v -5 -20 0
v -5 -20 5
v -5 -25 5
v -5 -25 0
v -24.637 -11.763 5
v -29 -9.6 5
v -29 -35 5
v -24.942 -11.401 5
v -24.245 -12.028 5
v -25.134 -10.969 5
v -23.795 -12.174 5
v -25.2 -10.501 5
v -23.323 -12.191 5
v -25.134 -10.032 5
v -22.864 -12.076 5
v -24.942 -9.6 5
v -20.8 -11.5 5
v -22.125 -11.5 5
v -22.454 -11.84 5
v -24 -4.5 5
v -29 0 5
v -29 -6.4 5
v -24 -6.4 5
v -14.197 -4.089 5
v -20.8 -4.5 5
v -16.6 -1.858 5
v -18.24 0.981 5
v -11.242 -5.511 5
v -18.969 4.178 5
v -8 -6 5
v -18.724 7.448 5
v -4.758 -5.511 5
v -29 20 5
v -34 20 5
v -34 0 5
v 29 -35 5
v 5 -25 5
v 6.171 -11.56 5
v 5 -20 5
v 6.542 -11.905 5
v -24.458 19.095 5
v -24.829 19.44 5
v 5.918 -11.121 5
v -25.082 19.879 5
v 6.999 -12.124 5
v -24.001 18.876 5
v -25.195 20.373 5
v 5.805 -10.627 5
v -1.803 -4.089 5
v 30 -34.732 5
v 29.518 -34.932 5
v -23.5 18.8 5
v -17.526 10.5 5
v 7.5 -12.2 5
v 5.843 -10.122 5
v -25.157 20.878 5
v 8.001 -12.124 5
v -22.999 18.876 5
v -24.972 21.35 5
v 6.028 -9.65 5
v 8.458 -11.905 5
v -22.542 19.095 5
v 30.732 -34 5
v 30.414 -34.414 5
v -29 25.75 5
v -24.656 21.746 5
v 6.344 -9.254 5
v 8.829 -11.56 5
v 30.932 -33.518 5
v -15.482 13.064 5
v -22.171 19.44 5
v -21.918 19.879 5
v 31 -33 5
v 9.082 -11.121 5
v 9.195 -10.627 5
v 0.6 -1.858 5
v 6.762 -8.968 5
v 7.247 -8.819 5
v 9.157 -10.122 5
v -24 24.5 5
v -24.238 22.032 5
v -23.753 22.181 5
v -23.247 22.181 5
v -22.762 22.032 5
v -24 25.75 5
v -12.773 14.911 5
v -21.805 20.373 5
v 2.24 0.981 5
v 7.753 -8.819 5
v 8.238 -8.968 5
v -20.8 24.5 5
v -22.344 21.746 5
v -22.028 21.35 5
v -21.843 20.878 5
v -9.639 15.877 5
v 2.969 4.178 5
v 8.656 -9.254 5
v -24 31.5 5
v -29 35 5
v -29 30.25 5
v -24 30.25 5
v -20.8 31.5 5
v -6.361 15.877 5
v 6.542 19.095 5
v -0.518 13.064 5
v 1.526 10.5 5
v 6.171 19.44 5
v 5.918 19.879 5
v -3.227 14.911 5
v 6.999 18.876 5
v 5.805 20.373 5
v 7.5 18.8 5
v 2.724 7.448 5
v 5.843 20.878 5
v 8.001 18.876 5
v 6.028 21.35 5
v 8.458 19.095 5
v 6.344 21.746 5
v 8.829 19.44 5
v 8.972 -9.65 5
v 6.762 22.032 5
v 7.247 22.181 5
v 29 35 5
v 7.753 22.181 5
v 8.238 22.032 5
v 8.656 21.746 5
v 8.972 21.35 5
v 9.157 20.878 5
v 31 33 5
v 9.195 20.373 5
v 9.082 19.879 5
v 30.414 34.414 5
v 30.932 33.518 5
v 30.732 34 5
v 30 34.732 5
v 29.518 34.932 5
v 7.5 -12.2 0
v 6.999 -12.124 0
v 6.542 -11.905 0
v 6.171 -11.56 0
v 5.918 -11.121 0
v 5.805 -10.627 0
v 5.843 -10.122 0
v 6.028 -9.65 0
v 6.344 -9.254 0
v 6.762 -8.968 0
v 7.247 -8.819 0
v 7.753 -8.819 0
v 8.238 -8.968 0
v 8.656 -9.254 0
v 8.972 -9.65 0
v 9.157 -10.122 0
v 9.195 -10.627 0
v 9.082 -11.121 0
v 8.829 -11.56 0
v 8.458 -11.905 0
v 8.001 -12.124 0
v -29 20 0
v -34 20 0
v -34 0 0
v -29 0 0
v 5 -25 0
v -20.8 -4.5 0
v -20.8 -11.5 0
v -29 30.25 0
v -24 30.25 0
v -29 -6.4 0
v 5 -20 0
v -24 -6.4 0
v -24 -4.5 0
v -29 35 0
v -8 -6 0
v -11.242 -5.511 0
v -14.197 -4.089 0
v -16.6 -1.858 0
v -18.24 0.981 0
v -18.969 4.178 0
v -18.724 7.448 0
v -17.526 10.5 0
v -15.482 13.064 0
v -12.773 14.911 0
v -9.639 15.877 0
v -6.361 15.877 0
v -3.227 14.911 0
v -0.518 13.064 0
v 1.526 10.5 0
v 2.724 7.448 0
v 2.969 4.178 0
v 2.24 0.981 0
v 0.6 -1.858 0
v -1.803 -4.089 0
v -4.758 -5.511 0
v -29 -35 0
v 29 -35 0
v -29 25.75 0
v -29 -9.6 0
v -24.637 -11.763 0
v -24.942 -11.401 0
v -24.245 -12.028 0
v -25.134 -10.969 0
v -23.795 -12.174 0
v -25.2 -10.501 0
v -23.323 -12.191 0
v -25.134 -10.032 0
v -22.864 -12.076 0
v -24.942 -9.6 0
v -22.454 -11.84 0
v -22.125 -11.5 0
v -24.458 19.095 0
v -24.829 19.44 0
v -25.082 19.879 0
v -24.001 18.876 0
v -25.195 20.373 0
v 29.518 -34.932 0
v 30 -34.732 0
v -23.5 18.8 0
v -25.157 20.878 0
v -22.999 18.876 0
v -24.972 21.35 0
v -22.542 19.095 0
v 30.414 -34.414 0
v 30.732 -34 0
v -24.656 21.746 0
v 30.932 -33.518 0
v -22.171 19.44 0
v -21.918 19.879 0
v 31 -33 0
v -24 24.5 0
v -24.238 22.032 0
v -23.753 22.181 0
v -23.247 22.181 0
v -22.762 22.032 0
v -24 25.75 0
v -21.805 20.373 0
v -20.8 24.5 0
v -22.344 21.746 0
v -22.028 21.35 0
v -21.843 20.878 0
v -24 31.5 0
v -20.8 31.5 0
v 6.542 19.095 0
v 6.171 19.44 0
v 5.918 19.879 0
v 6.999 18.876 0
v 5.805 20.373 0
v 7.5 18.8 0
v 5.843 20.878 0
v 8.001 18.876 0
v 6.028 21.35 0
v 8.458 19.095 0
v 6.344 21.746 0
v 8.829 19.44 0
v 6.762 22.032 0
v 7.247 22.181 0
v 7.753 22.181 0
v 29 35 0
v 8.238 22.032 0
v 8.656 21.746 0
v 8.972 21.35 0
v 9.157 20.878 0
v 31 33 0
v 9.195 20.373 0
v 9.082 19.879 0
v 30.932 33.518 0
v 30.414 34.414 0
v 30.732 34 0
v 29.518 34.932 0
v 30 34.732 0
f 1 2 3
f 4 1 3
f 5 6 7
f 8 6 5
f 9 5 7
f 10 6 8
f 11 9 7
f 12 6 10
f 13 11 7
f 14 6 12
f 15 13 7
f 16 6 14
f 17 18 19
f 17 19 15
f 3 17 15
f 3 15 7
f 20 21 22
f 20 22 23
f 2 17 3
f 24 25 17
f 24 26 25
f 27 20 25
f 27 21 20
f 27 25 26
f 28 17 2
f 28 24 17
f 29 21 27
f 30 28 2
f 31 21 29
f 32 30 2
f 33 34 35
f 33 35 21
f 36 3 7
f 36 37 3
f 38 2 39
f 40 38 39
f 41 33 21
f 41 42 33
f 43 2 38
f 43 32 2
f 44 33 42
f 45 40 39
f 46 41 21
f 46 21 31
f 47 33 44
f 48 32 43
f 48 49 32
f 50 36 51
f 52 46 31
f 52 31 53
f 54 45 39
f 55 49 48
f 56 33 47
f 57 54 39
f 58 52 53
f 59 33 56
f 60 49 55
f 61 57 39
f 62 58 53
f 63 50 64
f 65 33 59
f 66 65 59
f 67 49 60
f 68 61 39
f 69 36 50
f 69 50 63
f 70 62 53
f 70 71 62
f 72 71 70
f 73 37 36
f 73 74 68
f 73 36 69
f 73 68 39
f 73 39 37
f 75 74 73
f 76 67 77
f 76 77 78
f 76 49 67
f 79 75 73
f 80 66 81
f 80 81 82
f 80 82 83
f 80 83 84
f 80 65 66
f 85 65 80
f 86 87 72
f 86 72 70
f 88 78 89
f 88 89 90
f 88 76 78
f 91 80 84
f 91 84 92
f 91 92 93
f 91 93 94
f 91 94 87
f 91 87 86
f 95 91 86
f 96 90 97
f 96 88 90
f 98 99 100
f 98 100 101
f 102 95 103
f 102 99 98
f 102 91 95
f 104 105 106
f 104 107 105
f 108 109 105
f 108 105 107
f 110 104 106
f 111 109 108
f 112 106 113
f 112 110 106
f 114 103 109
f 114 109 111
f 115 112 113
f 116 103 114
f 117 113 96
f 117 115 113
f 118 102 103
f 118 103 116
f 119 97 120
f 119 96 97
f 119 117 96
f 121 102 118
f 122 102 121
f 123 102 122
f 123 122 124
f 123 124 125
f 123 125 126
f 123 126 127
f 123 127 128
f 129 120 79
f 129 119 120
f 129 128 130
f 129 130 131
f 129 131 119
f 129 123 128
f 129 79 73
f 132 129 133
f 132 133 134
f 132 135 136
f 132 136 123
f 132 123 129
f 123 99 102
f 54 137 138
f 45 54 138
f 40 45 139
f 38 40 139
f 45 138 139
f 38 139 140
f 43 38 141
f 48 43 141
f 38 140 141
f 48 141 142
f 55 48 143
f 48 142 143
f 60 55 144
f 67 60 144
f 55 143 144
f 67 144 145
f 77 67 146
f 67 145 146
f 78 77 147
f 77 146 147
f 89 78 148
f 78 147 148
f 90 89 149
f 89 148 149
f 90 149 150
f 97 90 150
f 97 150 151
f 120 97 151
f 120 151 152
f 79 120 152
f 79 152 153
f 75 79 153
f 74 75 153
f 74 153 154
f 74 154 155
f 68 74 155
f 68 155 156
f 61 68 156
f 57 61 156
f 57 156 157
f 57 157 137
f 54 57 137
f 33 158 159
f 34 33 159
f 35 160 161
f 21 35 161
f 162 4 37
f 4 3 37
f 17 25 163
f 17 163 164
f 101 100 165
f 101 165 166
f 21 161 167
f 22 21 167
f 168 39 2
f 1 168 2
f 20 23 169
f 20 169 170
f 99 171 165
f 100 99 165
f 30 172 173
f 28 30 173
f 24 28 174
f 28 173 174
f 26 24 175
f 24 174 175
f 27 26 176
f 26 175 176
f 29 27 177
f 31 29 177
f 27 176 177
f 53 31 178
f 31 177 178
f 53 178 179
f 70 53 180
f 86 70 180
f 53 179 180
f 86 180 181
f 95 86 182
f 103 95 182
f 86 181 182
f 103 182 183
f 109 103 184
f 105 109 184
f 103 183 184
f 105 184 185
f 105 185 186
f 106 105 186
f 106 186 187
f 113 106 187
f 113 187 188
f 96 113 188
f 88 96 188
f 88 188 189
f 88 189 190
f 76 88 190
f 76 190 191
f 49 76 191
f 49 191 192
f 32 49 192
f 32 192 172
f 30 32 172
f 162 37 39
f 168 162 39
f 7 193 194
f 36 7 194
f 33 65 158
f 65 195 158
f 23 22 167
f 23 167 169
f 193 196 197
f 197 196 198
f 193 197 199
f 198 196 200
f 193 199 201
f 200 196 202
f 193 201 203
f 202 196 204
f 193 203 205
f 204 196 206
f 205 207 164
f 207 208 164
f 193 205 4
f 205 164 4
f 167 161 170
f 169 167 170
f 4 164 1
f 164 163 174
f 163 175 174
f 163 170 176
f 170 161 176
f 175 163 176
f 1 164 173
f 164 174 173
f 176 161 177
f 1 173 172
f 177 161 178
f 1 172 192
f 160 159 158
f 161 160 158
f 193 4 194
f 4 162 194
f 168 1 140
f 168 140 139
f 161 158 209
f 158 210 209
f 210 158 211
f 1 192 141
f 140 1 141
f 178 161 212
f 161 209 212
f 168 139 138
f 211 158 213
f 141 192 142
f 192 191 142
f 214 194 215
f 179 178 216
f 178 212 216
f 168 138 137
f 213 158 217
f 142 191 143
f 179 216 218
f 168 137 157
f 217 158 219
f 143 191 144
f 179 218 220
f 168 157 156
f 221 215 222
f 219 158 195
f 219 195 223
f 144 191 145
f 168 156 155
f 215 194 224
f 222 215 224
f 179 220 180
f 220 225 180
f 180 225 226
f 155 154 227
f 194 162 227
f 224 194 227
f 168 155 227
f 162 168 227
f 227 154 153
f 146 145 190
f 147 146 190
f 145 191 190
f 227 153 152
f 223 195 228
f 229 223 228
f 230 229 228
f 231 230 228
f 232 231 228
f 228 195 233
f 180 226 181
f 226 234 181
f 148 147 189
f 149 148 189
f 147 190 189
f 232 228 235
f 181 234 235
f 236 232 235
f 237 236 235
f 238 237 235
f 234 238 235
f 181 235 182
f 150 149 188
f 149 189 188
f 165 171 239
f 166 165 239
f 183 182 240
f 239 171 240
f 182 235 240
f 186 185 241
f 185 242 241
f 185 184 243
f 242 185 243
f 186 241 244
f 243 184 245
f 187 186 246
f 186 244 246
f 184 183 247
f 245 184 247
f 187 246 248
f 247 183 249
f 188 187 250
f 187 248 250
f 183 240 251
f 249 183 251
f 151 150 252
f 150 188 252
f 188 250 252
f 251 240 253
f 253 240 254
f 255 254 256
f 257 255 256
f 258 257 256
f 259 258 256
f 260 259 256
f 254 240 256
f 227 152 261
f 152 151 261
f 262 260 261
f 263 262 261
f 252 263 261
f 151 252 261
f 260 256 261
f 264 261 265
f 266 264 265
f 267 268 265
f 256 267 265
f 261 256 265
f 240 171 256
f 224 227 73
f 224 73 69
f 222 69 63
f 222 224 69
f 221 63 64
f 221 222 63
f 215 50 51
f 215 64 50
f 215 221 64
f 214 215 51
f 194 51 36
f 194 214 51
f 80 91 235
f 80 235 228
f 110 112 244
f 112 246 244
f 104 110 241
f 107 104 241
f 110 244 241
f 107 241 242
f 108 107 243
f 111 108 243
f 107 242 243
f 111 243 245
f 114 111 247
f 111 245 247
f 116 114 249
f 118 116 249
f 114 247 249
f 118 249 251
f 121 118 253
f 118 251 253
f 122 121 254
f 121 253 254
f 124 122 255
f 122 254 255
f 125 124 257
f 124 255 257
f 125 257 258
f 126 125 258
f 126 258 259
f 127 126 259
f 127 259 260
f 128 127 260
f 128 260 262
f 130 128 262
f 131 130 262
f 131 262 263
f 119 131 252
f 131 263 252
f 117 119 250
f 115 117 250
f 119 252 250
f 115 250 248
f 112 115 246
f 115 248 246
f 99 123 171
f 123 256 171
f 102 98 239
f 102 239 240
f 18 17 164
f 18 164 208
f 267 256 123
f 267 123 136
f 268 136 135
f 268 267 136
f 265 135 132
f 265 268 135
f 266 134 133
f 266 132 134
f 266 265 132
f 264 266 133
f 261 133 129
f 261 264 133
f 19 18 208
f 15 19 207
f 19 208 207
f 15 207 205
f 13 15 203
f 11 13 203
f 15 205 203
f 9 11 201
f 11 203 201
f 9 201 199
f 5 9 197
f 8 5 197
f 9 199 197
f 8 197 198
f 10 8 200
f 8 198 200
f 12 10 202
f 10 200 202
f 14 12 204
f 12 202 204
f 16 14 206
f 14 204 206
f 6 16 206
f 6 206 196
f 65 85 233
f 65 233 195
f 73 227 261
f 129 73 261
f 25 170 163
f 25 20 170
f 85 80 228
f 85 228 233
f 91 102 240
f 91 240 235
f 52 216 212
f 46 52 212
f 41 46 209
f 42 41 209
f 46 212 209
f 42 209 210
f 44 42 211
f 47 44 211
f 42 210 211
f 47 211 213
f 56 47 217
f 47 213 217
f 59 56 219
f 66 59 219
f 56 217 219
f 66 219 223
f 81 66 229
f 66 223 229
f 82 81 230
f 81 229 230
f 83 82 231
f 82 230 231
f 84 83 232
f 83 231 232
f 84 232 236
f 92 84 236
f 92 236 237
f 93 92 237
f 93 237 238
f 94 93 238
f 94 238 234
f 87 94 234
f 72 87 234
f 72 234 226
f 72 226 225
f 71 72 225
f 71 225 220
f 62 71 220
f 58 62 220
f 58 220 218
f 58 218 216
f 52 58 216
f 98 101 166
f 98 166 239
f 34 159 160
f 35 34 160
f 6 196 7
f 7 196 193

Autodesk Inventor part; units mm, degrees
ref_plane "YZ Plane" through (0, 0, 0) normal (1, 0, 0) x (0, 1, 0)
ref_plane "XZ Plane" through (0, 0, 0) normal (0, 1, 0) x (-1, 0, 0)
ref_plane "XY Plane" through (0, 0, 0) normal (0, 0, 1) x (1, 0, 0)
sketch "Sketch1" plane through (0, 0, 0) normal (0, 0, 1) x (1, 0, 0)
  line L0 (29, 35) -> (-29, 35)
  line L1 (-29, 35) -> (-29, 20)
  line L2 (-29, 20) -> (-34, 20)
  line L3 (-34, 20) -> (-34, 0)
  line L4 (-34, 0) -> (-29, 0)
  line L5 (-29, 0) -> (-29, -35)
  line L6 (-29, -35) -> (29, -35)
  line L7 (31, -33) -> (31, 33)
  arc A0 (31, 33) -> (29, 35) centre (29, 33) ccw
  arc A1 (29, -35) -> (31, -33) centre (29, -33) ccw
  point P0 (0, 0)
  point P1 (31, 35)
  point P2 (31, -35)
  point P3 (31, 0)
  point P4 (0, 35)
  dimension "d0" = 70
  dimension "d1" = 5
  dimension "d2" = 20
  dimension "d3" = 15
  dimension "d4" = 60
  dimension "d7" = 2
extrude "Extrusion1" add sketch "Sketch1" along normal blind 5
sketch "Sketch2" plane through (0, 0, 5) normal (0, 0, 1) x (1, 0, 0)
  line L0 (-29, 35) -> (-29, 20) projected
  point P0 (0, 0)
  point P1 (-8, 5)
  dimension "d8" = 5
  dimension "d33" = 21
hole "Hole1" at (-8, 5, 5) direction (0, 0, -1) diameter 22 depth 8 tip angle 118
sketch "Sketch3" plane through (0, 0, 5) normal (0, 0, 1) x (1, 0, 0)
  circle A0 centre (-8, 5) radius 11 projected
  line L0 (-23.5, -10.5) -> (7.5, -10.5) construction
  line L1 (7.5, -10.5) -> (7.5, 20.5) construction
  line L2 (7.5, 20.5) -> (-23.5, 20.5) construction
  line L3 (-23.5, 20.5) -> (-23.5, -10.5) construction
  line L4 (-23.5, -10.5) -> (7.5, 20.5) construction
  line L5 (7.5, -10.5) -> (-23.5, 20.5) construction
  point P0 (0, 0)
  dimension "d17" = 31
  dimension "d18" = 31
hole "Hole2" at (-23.5, 20.5, 5) at (7.5, 20.5, 5) at (7.5, -10.5, 5) at (-23.5, -10.5, 5) direction (0, 0, -1) diameter 3.4 depth 8 tip angle 118 clearance for "Countersunk Flat Head Screw DIN EN ISO 2009" size "M3" standard "DIN"
sketch "Sketch4" plane through (0, 0, 5) normal (0, 0, 1) x (1, 0, 0)
  line L0 (-29, 20) -> (-29, 35) projected
  line L1 (-29, 30.25) -> (-24, 30.25)
  line L2 (-24, 30.25) -> (-24, 31.5)
  line L3 (-24, 31.5) -> (-20.8, 31.5)
  line L4 (-20.8, 31.5) -> (-20.8, 24.5)
  line L5 (-20.8, 24.5) -> (-24, 24.5)
  line L6 (-24, 24.5) -> (-24, 25.75)
  line L7 (-24, 25.75) -> (-29, 25.75)
  line L8 (-29, 25.75) -> (-29, 30.25)
  line L9 (-29, 20) -> (-34, 20) projected
  line L10 (-29, -6.4) -> (-24, -6.4)
  line L11 (-24, -6.4) -> (-24, -4.5)
  line L12 (-24, -4.5) -> (-20.8, -4.5)
  line L13 (-20.8, -4.5) -> (-20.8, -11.5)
  line L14 (-20.8, -11.5) -> (-24, -11.5)
  line L15 (-24, -11.5) -> (-24, -9.6)
  line L16 (-24, -9.6) -> (-29, -9.6)
  line L17 (-29, -9.6) -> (-29, -6.4)
  line L18 (-29, -35) -> (-29, 0) projected
  line L19 (-34, 0) -> (-29, 0) projected
  point P0 (0, 0)
  point P1 (-29, 28)
  point P2 (-20.8, 28)
  point P3 (-20.8, -8)
  point P4 (-29, -8)
  dimension "d37" = 7
  dimension "d38" = 3.2
  dimension "d39" = 5
  dimension "d42" = 4.5
  dimension "d43" = 8
  dimension "d44" = 7
  dimension "d45" = 3.2
  dimension "d46" = 5
  dimension "d47" = 3.2
  dimension "d48" = 8
extrude "Extrusion2" cut sketch "Sketch4" against normal blind 5
sketch "Sketch5" plane through (0, 0, 5) normal (0, 0, 1) x (1, 0, 0)
  line L0 (-5, -25) -> (5, -25)
  line L1 (5, -25) -> (5, -20)
  line L2 (5, -20) -> (-5, -20)
  line L3 (-5, -20) -> (-5, -25)
  line L4 (-5, -25) -> (5, -20) construction
  line L5 (5, -25) -> (-5, -20) construction
  line L6 (-29, -35) -> (29, -35) projected
  point P0 (0, 0)
  point P1 (0, -22.5)
  point P2 (0, -22.5)
  dimension "d28" = 10
  dimension "d29" = 5
  dimension "d34" = 10
extrude "Extrusion3" cut sketch "Sketch5" against normal blind 5
properties part number "Belt_Holder2" material "Polycarbonate, Clear"
